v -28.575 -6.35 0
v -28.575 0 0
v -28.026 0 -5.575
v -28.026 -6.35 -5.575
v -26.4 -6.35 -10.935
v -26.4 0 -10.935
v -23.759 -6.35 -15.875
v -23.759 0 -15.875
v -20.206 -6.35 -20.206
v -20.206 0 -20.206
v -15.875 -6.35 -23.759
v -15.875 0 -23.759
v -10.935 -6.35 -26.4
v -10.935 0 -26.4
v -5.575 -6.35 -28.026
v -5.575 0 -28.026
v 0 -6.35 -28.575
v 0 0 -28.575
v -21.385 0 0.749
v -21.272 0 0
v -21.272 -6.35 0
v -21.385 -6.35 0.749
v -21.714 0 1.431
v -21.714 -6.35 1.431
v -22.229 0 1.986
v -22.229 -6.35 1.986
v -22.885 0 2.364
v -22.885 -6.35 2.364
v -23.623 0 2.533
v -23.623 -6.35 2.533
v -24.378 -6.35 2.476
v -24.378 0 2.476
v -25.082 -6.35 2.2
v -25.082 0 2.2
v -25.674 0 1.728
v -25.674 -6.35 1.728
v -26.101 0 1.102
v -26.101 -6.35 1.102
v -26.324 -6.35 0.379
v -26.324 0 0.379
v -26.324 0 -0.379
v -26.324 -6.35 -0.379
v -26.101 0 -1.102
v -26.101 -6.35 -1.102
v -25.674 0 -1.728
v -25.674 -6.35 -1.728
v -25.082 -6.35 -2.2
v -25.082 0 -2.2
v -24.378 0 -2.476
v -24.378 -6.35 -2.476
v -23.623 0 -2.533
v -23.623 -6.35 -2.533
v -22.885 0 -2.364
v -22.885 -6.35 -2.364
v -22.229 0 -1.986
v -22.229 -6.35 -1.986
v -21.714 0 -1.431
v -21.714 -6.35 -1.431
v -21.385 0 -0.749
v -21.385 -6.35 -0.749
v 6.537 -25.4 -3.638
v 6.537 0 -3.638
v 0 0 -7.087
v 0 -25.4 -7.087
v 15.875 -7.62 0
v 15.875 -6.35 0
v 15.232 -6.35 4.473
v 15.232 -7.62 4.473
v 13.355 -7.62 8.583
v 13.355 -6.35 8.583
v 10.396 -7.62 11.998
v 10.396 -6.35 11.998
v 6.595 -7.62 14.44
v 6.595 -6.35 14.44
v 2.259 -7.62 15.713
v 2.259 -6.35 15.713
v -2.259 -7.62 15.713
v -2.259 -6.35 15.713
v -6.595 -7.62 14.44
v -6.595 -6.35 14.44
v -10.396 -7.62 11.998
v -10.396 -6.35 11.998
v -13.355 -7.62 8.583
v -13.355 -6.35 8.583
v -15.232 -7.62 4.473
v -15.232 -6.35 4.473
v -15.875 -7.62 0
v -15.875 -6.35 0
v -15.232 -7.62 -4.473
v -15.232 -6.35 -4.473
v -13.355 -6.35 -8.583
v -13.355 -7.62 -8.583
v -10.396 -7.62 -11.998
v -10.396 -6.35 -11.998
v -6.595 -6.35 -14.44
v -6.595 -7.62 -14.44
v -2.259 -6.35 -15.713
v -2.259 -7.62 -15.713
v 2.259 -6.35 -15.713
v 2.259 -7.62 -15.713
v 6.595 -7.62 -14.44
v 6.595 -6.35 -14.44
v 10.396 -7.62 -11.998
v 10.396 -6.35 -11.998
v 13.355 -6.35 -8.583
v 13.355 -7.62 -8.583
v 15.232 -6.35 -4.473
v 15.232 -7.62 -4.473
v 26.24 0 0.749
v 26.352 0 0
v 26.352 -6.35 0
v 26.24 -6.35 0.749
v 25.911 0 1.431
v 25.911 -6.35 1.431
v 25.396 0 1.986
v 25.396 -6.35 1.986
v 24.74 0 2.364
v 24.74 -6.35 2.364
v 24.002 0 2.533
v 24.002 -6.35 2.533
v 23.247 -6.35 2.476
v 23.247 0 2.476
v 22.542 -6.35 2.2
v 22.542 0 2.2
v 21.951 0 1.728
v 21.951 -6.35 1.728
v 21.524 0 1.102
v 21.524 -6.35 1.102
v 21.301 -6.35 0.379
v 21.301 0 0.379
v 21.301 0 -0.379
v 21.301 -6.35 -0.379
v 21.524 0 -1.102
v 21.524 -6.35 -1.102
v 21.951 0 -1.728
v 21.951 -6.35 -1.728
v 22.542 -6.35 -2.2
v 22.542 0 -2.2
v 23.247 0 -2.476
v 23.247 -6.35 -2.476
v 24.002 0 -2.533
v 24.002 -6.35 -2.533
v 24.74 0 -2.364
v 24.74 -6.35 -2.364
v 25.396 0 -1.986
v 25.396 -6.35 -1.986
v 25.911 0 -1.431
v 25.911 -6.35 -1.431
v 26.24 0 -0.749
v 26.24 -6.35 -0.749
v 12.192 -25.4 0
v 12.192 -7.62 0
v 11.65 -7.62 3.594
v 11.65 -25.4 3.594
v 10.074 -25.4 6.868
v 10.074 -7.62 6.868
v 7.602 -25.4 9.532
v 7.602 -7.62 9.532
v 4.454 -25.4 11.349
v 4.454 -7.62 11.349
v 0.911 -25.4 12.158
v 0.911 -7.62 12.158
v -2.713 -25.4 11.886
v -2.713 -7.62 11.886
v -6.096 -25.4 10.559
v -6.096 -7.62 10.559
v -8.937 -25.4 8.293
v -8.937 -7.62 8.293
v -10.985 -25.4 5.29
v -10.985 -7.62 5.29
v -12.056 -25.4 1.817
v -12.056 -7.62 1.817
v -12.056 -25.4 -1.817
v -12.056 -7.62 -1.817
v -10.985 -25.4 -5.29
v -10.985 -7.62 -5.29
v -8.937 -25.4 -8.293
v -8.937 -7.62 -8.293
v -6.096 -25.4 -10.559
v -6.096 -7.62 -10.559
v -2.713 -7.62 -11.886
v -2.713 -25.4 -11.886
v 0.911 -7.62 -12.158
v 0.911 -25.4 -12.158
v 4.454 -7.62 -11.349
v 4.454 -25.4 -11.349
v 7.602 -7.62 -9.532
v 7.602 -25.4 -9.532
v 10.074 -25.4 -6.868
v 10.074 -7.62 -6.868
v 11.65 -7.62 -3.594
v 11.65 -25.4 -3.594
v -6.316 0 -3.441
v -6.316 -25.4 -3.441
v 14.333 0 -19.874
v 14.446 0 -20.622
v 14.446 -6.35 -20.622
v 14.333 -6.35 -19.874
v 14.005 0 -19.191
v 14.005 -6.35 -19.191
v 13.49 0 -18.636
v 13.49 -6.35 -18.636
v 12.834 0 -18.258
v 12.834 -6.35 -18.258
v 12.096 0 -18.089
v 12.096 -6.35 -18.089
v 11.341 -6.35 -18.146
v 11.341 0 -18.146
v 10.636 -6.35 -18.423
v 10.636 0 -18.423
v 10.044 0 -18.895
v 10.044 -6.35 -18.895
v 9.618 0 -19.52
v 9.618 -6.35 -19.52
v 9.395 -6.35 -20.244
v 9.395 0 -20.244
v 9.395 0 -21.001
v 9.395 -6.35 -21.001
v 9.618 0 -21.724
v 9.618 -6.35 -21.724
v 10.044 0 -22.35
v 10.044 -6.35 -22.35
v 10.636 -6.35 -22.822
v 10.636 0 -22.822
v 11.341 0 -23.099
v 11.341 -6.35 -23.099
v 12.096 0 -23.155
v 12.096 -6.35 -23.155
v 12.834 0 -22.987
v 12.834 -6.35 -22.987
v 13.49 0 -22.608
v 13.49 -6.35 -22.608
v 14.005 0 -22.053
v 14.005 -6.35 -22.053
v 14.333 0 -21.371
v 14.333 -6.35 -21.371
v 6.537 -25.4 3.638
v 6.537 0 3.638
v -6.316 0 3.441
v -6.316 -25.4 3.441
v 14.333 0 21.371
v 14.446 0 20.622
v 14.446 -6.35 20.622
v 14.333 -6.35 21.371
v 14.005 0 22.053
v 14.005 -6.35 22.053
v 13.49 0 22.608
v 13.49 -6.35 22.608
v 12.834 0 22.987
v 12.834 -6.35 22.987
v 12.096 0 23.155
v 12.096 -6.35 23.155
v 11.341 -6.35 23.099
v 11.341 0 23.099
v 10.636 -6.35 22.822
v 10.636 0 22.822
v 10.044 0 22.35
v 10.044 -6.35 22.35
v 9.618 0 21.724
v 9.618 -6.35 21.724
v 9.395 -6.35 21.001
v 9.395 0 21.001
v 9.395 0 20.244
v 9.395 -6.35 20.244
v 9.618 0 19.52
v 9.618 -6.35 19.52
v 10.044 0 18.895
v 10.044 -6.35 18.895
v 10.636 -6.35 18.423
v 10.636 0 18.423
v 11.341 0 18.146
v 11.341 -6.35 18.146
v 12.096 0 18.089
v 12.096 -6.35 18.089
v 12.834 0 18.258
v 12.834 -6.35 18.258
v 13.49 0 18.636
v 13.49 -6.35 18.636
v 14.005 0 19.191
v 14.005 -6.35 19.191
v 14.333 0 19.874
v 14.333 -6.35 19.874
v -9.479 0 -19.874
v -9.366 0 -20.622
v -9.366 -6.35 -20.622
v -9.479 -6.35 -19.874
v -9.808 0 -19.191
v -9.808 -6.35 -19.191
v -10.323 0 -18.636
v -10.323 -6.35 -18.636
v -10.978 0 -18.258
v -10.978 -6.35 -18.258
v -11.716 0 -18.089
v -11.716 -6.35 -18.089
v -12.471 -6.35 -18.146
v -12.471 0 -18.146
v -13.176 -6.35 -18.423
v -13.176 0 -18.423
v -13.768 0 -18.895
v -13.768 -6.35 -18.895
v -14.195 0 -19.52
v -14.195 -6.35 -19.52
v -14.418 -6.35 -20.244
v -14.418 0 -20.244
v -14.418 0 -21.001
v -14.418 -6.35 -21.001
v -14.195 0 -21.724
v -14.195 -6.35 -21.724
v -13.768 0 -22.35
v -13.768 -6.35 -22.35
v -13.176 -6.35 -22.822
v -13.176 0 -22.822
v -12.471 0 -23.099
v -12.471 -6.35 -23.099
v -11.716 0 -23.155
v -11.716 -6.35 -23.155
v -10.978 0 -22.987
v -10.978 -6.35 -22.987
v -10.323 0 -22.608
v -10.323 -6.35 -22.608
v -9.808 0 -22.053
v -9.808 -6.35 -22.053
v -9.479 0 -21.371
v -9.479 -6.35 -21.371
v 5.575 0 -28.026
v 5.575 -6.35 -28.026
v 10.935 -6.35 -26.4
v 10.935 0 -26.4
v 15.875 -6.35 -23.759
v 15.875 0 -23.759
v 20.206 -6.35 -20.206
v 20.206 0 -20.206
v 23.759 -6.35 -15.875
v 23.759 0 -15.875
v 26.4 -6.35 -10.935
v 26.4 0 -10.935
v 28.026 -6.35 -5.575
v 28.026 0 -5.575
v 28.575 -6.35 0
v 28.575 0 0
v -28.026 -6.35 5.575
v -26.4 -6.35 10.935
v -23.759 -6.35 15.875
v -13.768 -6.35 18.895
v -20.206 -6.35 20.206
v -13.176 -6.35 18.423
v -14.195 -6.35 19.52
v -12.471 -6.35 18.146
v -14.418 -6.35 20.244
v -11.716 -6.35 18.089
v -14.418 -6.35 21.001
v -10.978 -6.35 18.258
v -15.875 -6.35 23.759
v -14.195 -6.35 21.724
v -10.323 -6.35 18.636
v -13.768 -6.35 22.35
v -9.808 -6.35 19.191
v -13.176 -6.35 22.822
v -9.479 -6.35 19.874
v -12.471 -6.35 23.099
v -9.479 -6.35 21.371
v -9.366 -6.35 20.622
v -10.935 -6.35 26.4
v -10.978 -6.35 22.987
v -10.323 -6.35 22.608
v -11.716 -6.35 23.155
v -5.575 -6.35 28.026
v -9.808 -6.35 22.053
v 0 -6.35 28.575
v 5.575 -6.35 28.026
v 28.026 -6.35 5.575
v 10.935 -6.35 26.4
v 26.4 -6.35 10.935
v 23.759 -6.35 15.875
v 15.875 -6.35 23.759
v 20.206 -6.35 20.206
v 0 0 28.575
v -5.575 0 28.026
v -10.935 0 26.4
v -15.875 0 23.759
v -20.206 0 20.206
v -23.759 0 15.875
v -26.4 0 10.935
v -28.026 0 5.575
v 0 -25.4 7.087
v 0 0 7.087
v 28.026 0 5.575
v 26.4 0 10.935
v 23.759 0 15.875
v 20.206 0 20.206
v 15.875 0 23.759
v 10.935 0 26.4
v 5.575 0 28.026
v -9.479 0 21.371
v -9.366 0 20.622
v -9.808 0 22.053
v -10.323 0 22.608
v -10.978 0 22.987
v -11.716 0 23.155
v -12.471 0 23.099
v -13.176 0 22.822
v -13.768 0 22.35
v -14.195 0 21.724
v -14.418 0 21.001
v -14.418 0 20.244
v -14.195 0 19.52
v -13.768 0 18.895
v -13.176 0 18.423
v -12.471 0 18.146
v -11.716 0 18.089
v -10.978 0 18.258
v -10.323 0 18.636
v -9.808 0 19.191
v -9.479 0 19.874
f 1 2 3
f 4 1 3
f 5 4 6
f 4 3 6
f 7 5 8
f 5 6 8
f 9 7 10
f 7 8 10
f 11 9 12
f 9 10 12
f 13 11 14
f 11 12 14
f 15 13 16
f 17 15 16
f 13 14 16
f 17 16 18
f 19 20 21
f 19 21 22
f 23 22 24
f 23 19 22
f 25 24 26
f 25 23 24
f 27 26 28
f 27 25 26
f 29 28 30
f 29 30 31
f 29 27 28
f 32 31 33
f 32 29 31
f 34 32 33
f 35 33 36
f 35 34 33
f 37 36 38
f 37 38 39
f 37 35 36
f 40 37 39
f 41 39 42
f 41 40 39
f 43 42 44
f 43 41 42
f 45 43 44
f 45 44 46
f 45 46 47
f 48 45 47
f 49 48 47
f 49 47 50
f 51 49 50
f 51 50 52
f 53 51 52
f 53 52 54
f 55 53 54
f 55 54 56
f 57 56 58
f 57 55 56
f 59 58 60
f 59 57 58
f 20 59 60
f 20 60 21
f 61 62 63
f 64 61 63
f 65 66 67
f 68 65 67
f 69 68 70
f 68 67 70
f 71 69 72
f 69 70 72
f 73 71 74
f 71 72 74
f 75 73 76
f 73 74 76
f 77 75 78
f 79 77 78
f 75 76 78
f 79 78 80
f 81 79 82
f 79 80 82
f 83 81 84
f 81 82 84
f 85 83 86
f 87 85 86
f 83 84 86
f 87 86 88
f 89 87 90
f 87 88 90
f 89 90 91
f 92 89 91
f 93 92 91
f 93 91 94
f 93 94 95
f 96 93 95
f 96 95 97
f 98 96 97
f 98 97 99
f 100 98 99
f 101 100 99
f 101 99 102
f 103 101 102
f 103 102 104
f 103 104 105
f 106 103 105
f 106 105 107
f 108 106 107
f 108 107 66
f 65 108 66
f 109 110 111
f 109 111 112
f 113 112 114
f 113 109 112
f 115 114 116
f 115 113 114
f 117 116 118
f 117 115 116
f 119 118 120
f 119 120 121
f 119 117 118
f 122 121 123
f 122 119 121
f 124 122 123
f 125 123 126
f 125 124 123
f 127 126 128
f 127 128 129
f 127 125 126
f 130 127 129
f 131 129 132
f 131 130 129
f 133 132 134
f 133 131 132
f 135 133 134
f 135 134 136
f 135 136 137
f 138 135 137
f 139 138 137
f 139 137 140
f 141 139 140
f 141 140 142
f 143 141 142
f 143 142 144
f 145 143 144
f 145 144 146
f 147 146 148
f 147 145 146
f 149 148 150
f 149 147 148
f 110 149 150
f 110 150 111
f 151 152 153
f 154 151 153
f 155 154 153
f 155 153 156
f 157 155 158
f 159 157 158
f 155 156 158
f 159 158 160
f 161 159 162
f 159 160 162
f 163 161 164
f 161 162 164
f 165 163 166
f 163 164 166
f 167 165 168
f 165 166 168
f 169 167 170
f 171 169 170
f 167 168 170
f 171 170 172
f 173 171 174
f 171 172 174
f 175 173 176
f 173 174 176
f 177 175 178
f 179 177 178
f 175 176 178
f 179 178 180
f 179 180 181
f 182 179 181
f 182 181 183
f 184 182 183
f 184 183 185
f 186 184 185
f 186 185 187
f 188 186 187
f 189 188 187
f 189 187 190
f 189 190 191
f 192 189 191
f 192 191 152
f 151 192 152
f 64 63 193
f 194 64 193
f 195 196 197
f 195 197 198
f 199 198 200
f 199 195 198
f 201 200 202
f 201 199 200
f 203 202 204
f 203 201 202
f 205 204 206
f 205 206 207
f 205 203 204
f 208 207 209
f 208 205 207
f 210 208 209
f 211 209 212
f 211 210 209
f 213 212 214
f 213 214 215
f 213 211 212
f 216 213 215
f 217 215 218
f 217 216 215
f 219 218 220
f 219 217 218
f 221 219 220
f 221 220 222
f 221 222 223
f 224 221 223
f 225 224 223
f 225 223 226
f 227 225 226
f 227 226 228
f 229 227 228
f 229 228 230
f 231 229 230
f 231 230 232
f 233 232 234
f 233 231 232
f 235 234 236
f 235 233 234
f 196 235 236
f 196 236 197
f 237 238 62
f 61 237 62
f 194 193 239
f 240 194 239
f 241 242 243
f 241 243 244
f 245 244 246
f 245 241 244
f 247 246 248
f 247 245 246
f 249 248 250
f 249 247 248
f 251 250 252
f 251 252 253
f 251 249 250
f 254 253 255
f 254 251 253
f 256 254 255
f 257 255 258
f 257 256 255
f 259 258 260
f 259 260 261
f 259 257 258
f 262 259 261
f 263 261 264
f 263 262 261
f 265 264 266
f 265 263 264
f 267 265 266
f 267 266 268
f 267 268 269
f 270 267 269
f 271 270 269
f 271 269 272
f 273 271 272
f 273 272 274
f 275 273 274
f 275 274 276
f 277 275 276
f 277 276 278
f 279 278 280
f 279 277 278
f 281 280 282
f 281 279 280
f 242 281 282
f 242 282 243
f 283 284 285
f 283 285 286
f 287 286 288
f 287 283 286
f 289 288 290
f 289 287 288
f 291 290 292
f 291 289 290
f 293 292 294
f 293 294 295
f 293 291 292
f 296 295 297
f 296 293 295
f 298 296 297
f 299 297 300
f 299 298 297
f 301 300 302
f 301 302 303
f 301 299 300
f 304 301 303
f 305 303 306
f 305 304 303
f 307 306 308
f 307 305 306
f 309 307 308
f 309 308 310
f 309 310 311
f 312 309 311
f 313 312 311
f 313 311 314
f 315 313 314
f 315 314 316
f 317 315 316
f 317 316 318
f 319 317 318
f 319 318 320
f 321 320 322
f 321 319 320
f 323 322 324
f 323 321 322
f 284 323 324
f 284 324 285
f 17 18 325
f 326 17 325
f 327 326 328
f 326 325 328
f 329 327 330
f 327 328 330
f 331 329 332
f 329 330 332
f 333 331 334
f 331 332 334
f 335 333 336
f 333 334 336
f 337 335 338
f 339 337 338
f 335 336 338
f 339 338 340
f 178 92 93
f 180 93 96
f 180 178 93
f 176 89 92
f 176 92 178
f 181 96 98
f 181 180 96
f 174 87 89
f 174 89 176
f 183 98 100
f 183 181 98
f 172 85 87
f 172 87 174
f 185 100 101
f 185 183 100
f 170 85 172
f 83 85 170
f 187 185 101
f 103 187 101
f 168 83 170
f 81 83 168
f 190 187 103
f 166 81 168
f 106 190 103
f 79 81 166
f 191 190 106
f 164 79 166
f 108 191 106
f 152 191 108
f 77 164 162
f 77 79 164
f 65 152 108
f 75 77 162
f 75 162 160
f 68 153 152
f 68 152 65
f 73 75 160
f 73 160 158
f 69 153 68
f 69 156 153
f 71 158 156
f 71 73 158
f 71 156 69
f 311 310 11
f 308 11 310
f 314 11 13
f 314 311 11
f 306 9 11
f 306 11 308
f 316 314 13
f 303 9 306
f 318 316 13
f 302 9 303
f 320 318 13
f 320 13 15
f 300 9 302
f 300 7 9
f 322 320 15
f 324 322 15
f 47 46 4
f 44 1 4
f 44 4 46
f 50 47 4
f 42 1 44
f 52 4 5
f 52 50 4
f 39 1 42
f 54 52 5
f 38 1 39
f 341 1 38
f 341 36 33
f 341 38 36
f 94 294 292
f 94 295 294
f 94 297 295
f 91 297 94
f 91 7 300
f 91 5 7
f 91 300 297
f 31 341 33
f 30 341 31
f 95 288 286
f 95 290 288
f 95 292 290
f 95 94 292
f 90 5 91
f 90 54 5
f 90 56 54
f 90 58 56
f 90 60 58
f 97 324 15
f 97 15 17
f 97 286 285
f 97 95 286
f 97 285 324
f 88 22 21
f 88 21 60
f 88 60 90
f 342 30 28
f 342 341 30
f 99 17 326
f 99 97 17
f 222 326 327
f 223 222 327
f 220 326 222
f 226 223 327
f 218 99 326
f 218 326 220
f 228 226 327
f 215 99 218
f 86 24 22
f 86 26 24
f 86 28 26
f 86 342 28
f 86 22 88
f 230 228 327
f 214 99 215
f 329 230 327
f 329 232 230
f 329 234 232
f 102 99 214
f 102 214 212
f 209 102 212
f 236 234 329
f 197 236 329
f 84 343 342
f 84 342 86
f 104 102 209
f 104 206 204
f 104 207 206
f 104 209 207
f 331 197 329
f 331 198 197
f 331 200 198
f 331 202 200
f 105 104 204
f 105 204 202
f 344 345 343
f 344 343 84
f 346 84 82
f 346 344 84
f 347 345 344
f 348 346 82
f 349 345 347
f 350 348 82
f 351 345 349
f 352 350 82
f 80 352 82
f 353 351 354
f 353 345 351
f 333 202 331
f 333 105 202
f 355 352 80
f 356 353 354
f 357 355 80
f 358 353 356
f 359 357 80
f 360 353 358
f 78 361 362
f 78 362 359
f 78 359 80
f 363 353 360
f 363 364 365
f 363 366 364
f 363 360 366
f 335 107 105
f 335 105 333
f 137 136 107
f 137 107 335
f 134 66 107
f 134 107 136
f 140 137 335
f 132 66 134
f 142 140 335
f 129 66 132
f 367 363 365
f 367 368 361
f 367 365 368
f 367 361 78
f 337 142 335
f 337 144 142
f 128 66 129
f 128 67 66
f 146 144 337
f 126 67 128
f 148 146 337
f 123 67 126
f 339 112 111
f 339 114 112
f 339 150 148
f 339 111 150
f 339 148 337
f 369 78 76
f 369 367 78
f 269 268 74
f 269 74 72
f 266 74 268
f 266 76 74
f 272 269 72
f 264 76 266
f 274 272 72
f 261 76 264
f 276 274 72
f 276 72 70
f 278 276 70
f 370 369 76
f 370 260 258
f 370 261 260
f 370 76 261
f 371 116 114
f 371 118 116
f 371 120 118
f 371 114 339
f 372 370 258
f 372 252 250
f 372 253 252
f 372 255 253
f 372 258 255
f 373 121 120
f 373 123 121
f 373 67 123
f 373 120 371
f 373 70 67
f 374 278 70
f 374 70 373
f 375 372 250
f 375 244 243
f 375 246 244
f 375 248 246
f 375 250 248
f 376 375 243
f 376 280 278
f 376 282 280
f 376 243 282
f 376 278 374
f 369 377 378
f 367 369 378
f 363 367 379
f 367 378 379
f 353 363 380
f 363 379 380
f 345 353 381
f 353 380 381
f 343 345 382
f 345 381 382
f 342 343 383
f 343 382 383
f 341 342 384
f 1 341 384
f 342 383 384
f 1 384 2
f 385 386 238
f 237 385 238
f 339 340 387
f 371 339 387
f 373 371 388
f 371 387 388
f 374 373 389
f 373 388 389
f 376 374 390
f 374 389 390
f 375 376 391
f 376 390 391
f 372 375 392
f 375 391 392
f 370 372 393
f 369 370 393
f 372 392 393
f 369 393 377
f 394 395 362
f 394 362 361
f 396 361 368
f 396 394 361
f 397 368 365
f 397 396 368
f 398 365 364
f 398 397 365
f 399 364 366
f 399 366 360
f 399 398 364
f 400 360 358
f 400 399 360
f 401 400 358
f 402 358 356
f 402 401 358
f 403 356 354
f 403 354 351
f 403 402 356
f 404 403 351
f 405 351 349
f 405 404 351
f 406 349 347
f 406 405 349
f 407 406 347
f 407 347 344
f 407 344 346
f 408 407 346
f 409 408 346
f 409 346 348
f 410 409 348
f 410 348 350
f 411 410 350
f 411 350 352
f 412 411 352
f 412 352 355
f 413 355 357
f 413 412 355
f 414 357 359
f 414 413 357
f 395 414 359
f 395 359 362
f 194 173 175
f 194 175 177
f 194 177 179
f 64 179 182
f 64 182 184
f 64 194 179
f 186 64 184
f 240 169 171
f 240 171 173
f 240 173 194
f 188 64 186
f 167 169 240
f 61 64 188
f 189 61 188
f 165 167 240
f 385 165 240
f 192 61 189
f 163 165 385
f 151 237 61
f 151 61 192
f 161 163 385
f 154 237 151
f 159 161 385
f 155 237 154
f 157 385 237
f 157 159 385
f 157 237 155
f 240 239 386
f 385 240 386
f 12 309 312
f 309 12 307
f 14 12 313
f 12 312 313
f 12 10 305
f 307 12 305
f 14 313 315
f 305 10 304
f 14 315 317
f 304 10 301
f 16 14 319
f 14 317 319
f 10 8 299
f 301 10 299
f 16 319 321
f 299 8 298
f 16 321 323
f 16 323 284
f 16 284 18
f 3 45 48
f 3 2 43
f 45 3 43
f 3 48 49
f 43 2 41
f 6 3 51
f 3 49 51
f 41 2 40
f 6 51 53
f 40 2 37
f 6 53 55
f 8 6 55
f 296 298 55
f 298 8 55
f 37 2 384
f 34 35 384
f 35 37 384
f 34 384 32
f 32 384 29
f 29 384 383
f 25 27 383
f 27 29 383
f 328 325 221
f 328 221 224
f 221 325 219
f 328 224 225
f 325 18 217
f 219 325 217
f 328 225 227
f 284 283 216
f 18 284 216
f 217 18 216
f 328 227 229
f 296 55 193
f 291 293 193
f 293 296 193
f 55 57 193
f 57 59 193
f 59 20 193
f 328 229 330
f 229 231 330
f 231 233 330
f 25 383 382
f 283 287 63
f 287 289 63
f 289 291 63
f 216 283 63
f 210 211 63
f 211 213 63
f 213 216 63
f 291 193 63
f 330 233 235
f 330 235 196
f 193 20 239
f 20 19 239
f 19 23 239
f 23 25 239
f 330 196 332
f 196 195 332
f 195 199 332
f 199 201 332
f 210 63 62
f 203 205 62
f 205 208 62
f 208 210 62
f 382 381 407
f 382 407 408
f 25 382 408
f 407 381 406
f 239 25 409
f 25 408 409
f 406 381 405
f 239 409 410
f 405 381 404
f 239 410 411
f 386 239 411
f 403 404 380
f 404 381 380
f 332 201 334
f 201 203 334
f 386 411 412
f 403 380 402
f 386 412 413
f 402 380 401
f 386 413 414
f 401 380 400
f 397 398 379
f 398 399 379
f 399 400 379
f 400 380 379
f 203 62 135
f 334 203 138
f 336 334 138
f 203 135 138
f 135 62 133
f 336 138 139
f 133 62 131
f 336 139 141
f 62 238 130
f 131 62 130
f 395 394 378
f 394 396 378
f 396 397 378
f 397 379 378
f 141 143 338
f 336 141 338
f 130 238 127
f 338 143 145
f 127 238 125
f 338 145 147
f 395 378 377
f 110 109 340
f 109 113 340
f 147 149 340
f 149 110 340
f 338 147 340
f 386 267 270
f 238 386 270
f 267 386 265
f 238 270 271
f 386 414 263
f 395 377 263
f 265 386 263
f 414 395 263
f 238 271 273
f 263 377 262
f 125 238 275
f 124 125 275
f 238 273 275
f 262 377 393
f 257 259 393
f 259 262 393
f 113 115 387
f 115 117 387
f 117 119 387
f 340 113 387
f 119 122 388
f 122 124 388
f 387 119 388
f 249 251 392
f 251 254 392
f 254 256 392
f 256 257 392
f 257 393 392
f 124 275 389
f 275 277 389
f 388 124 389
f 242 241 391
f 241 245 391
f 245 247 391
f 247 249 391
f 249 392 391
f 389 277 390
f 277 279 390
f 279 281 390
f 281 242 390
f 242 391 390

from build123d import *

# Parameters (mm, degrees)
F0_R     = 2.54
F0_R_2   = 15.875
F1_DEPTH = 6.35
F0_R_3   = 12.192
F2_DEPTH = 7.62
F3_DEPTH = 25.4


with BuildPart() as f1:
    # F0 (on Front) → F1 (new body)
    with BuildSketch(Plane.XZ):
        with BuildLine():
            ThreePointArc((28.575, 0), (20.205576, 20.205576), (0, 28.575))
            ThreePointArc((0, 28.575), (-20.205576, 20.205576), (-28.575, 0))
            ThreePointArc((-28.575, 0), (-20.205576, -20.205576), (0, -28.575))
            ThreePointArc((0, -28.575), (20.205576, -20.205576), (28.575, 0))
        make_face()
        with Locations((-11.90625, -20.62223)):
            Circle(F0_R, mode=Mode.SUBTRACT)
        with Locations((11.90625, -20.62223)):
            Circle(F0_R, mode=Mode.SUBTRACT)
        with Locations((-23.8125, 0)):
            Circle(F0_R, mode=Mode.SUBTRACT)
        with Locations((-11.90625, 20.62223)):
            Circle(F0_R, mode=Mode.SUBTRACT)
        Circle(F0_R_2, mode=Mode.SUBTRACT)
        with Locations((23.8125, 0)):
            Circle(F0_R, mode=Mode.SUBTRACT)
        with Locations((11.90625, 20.62223)):
            Circle(F0_R, mode=Mode.SUBTRACT)
    extrude(amount=F1_DEPTH)

    # F0 (on Front) → F2 (join)
    with BuildSketch(Plane.XZ):
        Circle(F0_R_2)
        Circle(F0_R_3, mode=Mode.SUBTRACT)
    extrude(amount=F2_DEPTH)

    # F0 (on Front) → F3 (join)
    with BuildSketch(Plane.XZ):
        Circle(F0_R_3)
        Polygon((0, 7.086949), (6.536717, 3.637514), (6.536717, -3.637514), (0, -7.086949), (-6.315683, -3.440588), (-6.315683, 3.440588), align=None, mode=Mode.SUBTRACT)
    extrude(amount=F3_DEPTH)


solid = f1.part
